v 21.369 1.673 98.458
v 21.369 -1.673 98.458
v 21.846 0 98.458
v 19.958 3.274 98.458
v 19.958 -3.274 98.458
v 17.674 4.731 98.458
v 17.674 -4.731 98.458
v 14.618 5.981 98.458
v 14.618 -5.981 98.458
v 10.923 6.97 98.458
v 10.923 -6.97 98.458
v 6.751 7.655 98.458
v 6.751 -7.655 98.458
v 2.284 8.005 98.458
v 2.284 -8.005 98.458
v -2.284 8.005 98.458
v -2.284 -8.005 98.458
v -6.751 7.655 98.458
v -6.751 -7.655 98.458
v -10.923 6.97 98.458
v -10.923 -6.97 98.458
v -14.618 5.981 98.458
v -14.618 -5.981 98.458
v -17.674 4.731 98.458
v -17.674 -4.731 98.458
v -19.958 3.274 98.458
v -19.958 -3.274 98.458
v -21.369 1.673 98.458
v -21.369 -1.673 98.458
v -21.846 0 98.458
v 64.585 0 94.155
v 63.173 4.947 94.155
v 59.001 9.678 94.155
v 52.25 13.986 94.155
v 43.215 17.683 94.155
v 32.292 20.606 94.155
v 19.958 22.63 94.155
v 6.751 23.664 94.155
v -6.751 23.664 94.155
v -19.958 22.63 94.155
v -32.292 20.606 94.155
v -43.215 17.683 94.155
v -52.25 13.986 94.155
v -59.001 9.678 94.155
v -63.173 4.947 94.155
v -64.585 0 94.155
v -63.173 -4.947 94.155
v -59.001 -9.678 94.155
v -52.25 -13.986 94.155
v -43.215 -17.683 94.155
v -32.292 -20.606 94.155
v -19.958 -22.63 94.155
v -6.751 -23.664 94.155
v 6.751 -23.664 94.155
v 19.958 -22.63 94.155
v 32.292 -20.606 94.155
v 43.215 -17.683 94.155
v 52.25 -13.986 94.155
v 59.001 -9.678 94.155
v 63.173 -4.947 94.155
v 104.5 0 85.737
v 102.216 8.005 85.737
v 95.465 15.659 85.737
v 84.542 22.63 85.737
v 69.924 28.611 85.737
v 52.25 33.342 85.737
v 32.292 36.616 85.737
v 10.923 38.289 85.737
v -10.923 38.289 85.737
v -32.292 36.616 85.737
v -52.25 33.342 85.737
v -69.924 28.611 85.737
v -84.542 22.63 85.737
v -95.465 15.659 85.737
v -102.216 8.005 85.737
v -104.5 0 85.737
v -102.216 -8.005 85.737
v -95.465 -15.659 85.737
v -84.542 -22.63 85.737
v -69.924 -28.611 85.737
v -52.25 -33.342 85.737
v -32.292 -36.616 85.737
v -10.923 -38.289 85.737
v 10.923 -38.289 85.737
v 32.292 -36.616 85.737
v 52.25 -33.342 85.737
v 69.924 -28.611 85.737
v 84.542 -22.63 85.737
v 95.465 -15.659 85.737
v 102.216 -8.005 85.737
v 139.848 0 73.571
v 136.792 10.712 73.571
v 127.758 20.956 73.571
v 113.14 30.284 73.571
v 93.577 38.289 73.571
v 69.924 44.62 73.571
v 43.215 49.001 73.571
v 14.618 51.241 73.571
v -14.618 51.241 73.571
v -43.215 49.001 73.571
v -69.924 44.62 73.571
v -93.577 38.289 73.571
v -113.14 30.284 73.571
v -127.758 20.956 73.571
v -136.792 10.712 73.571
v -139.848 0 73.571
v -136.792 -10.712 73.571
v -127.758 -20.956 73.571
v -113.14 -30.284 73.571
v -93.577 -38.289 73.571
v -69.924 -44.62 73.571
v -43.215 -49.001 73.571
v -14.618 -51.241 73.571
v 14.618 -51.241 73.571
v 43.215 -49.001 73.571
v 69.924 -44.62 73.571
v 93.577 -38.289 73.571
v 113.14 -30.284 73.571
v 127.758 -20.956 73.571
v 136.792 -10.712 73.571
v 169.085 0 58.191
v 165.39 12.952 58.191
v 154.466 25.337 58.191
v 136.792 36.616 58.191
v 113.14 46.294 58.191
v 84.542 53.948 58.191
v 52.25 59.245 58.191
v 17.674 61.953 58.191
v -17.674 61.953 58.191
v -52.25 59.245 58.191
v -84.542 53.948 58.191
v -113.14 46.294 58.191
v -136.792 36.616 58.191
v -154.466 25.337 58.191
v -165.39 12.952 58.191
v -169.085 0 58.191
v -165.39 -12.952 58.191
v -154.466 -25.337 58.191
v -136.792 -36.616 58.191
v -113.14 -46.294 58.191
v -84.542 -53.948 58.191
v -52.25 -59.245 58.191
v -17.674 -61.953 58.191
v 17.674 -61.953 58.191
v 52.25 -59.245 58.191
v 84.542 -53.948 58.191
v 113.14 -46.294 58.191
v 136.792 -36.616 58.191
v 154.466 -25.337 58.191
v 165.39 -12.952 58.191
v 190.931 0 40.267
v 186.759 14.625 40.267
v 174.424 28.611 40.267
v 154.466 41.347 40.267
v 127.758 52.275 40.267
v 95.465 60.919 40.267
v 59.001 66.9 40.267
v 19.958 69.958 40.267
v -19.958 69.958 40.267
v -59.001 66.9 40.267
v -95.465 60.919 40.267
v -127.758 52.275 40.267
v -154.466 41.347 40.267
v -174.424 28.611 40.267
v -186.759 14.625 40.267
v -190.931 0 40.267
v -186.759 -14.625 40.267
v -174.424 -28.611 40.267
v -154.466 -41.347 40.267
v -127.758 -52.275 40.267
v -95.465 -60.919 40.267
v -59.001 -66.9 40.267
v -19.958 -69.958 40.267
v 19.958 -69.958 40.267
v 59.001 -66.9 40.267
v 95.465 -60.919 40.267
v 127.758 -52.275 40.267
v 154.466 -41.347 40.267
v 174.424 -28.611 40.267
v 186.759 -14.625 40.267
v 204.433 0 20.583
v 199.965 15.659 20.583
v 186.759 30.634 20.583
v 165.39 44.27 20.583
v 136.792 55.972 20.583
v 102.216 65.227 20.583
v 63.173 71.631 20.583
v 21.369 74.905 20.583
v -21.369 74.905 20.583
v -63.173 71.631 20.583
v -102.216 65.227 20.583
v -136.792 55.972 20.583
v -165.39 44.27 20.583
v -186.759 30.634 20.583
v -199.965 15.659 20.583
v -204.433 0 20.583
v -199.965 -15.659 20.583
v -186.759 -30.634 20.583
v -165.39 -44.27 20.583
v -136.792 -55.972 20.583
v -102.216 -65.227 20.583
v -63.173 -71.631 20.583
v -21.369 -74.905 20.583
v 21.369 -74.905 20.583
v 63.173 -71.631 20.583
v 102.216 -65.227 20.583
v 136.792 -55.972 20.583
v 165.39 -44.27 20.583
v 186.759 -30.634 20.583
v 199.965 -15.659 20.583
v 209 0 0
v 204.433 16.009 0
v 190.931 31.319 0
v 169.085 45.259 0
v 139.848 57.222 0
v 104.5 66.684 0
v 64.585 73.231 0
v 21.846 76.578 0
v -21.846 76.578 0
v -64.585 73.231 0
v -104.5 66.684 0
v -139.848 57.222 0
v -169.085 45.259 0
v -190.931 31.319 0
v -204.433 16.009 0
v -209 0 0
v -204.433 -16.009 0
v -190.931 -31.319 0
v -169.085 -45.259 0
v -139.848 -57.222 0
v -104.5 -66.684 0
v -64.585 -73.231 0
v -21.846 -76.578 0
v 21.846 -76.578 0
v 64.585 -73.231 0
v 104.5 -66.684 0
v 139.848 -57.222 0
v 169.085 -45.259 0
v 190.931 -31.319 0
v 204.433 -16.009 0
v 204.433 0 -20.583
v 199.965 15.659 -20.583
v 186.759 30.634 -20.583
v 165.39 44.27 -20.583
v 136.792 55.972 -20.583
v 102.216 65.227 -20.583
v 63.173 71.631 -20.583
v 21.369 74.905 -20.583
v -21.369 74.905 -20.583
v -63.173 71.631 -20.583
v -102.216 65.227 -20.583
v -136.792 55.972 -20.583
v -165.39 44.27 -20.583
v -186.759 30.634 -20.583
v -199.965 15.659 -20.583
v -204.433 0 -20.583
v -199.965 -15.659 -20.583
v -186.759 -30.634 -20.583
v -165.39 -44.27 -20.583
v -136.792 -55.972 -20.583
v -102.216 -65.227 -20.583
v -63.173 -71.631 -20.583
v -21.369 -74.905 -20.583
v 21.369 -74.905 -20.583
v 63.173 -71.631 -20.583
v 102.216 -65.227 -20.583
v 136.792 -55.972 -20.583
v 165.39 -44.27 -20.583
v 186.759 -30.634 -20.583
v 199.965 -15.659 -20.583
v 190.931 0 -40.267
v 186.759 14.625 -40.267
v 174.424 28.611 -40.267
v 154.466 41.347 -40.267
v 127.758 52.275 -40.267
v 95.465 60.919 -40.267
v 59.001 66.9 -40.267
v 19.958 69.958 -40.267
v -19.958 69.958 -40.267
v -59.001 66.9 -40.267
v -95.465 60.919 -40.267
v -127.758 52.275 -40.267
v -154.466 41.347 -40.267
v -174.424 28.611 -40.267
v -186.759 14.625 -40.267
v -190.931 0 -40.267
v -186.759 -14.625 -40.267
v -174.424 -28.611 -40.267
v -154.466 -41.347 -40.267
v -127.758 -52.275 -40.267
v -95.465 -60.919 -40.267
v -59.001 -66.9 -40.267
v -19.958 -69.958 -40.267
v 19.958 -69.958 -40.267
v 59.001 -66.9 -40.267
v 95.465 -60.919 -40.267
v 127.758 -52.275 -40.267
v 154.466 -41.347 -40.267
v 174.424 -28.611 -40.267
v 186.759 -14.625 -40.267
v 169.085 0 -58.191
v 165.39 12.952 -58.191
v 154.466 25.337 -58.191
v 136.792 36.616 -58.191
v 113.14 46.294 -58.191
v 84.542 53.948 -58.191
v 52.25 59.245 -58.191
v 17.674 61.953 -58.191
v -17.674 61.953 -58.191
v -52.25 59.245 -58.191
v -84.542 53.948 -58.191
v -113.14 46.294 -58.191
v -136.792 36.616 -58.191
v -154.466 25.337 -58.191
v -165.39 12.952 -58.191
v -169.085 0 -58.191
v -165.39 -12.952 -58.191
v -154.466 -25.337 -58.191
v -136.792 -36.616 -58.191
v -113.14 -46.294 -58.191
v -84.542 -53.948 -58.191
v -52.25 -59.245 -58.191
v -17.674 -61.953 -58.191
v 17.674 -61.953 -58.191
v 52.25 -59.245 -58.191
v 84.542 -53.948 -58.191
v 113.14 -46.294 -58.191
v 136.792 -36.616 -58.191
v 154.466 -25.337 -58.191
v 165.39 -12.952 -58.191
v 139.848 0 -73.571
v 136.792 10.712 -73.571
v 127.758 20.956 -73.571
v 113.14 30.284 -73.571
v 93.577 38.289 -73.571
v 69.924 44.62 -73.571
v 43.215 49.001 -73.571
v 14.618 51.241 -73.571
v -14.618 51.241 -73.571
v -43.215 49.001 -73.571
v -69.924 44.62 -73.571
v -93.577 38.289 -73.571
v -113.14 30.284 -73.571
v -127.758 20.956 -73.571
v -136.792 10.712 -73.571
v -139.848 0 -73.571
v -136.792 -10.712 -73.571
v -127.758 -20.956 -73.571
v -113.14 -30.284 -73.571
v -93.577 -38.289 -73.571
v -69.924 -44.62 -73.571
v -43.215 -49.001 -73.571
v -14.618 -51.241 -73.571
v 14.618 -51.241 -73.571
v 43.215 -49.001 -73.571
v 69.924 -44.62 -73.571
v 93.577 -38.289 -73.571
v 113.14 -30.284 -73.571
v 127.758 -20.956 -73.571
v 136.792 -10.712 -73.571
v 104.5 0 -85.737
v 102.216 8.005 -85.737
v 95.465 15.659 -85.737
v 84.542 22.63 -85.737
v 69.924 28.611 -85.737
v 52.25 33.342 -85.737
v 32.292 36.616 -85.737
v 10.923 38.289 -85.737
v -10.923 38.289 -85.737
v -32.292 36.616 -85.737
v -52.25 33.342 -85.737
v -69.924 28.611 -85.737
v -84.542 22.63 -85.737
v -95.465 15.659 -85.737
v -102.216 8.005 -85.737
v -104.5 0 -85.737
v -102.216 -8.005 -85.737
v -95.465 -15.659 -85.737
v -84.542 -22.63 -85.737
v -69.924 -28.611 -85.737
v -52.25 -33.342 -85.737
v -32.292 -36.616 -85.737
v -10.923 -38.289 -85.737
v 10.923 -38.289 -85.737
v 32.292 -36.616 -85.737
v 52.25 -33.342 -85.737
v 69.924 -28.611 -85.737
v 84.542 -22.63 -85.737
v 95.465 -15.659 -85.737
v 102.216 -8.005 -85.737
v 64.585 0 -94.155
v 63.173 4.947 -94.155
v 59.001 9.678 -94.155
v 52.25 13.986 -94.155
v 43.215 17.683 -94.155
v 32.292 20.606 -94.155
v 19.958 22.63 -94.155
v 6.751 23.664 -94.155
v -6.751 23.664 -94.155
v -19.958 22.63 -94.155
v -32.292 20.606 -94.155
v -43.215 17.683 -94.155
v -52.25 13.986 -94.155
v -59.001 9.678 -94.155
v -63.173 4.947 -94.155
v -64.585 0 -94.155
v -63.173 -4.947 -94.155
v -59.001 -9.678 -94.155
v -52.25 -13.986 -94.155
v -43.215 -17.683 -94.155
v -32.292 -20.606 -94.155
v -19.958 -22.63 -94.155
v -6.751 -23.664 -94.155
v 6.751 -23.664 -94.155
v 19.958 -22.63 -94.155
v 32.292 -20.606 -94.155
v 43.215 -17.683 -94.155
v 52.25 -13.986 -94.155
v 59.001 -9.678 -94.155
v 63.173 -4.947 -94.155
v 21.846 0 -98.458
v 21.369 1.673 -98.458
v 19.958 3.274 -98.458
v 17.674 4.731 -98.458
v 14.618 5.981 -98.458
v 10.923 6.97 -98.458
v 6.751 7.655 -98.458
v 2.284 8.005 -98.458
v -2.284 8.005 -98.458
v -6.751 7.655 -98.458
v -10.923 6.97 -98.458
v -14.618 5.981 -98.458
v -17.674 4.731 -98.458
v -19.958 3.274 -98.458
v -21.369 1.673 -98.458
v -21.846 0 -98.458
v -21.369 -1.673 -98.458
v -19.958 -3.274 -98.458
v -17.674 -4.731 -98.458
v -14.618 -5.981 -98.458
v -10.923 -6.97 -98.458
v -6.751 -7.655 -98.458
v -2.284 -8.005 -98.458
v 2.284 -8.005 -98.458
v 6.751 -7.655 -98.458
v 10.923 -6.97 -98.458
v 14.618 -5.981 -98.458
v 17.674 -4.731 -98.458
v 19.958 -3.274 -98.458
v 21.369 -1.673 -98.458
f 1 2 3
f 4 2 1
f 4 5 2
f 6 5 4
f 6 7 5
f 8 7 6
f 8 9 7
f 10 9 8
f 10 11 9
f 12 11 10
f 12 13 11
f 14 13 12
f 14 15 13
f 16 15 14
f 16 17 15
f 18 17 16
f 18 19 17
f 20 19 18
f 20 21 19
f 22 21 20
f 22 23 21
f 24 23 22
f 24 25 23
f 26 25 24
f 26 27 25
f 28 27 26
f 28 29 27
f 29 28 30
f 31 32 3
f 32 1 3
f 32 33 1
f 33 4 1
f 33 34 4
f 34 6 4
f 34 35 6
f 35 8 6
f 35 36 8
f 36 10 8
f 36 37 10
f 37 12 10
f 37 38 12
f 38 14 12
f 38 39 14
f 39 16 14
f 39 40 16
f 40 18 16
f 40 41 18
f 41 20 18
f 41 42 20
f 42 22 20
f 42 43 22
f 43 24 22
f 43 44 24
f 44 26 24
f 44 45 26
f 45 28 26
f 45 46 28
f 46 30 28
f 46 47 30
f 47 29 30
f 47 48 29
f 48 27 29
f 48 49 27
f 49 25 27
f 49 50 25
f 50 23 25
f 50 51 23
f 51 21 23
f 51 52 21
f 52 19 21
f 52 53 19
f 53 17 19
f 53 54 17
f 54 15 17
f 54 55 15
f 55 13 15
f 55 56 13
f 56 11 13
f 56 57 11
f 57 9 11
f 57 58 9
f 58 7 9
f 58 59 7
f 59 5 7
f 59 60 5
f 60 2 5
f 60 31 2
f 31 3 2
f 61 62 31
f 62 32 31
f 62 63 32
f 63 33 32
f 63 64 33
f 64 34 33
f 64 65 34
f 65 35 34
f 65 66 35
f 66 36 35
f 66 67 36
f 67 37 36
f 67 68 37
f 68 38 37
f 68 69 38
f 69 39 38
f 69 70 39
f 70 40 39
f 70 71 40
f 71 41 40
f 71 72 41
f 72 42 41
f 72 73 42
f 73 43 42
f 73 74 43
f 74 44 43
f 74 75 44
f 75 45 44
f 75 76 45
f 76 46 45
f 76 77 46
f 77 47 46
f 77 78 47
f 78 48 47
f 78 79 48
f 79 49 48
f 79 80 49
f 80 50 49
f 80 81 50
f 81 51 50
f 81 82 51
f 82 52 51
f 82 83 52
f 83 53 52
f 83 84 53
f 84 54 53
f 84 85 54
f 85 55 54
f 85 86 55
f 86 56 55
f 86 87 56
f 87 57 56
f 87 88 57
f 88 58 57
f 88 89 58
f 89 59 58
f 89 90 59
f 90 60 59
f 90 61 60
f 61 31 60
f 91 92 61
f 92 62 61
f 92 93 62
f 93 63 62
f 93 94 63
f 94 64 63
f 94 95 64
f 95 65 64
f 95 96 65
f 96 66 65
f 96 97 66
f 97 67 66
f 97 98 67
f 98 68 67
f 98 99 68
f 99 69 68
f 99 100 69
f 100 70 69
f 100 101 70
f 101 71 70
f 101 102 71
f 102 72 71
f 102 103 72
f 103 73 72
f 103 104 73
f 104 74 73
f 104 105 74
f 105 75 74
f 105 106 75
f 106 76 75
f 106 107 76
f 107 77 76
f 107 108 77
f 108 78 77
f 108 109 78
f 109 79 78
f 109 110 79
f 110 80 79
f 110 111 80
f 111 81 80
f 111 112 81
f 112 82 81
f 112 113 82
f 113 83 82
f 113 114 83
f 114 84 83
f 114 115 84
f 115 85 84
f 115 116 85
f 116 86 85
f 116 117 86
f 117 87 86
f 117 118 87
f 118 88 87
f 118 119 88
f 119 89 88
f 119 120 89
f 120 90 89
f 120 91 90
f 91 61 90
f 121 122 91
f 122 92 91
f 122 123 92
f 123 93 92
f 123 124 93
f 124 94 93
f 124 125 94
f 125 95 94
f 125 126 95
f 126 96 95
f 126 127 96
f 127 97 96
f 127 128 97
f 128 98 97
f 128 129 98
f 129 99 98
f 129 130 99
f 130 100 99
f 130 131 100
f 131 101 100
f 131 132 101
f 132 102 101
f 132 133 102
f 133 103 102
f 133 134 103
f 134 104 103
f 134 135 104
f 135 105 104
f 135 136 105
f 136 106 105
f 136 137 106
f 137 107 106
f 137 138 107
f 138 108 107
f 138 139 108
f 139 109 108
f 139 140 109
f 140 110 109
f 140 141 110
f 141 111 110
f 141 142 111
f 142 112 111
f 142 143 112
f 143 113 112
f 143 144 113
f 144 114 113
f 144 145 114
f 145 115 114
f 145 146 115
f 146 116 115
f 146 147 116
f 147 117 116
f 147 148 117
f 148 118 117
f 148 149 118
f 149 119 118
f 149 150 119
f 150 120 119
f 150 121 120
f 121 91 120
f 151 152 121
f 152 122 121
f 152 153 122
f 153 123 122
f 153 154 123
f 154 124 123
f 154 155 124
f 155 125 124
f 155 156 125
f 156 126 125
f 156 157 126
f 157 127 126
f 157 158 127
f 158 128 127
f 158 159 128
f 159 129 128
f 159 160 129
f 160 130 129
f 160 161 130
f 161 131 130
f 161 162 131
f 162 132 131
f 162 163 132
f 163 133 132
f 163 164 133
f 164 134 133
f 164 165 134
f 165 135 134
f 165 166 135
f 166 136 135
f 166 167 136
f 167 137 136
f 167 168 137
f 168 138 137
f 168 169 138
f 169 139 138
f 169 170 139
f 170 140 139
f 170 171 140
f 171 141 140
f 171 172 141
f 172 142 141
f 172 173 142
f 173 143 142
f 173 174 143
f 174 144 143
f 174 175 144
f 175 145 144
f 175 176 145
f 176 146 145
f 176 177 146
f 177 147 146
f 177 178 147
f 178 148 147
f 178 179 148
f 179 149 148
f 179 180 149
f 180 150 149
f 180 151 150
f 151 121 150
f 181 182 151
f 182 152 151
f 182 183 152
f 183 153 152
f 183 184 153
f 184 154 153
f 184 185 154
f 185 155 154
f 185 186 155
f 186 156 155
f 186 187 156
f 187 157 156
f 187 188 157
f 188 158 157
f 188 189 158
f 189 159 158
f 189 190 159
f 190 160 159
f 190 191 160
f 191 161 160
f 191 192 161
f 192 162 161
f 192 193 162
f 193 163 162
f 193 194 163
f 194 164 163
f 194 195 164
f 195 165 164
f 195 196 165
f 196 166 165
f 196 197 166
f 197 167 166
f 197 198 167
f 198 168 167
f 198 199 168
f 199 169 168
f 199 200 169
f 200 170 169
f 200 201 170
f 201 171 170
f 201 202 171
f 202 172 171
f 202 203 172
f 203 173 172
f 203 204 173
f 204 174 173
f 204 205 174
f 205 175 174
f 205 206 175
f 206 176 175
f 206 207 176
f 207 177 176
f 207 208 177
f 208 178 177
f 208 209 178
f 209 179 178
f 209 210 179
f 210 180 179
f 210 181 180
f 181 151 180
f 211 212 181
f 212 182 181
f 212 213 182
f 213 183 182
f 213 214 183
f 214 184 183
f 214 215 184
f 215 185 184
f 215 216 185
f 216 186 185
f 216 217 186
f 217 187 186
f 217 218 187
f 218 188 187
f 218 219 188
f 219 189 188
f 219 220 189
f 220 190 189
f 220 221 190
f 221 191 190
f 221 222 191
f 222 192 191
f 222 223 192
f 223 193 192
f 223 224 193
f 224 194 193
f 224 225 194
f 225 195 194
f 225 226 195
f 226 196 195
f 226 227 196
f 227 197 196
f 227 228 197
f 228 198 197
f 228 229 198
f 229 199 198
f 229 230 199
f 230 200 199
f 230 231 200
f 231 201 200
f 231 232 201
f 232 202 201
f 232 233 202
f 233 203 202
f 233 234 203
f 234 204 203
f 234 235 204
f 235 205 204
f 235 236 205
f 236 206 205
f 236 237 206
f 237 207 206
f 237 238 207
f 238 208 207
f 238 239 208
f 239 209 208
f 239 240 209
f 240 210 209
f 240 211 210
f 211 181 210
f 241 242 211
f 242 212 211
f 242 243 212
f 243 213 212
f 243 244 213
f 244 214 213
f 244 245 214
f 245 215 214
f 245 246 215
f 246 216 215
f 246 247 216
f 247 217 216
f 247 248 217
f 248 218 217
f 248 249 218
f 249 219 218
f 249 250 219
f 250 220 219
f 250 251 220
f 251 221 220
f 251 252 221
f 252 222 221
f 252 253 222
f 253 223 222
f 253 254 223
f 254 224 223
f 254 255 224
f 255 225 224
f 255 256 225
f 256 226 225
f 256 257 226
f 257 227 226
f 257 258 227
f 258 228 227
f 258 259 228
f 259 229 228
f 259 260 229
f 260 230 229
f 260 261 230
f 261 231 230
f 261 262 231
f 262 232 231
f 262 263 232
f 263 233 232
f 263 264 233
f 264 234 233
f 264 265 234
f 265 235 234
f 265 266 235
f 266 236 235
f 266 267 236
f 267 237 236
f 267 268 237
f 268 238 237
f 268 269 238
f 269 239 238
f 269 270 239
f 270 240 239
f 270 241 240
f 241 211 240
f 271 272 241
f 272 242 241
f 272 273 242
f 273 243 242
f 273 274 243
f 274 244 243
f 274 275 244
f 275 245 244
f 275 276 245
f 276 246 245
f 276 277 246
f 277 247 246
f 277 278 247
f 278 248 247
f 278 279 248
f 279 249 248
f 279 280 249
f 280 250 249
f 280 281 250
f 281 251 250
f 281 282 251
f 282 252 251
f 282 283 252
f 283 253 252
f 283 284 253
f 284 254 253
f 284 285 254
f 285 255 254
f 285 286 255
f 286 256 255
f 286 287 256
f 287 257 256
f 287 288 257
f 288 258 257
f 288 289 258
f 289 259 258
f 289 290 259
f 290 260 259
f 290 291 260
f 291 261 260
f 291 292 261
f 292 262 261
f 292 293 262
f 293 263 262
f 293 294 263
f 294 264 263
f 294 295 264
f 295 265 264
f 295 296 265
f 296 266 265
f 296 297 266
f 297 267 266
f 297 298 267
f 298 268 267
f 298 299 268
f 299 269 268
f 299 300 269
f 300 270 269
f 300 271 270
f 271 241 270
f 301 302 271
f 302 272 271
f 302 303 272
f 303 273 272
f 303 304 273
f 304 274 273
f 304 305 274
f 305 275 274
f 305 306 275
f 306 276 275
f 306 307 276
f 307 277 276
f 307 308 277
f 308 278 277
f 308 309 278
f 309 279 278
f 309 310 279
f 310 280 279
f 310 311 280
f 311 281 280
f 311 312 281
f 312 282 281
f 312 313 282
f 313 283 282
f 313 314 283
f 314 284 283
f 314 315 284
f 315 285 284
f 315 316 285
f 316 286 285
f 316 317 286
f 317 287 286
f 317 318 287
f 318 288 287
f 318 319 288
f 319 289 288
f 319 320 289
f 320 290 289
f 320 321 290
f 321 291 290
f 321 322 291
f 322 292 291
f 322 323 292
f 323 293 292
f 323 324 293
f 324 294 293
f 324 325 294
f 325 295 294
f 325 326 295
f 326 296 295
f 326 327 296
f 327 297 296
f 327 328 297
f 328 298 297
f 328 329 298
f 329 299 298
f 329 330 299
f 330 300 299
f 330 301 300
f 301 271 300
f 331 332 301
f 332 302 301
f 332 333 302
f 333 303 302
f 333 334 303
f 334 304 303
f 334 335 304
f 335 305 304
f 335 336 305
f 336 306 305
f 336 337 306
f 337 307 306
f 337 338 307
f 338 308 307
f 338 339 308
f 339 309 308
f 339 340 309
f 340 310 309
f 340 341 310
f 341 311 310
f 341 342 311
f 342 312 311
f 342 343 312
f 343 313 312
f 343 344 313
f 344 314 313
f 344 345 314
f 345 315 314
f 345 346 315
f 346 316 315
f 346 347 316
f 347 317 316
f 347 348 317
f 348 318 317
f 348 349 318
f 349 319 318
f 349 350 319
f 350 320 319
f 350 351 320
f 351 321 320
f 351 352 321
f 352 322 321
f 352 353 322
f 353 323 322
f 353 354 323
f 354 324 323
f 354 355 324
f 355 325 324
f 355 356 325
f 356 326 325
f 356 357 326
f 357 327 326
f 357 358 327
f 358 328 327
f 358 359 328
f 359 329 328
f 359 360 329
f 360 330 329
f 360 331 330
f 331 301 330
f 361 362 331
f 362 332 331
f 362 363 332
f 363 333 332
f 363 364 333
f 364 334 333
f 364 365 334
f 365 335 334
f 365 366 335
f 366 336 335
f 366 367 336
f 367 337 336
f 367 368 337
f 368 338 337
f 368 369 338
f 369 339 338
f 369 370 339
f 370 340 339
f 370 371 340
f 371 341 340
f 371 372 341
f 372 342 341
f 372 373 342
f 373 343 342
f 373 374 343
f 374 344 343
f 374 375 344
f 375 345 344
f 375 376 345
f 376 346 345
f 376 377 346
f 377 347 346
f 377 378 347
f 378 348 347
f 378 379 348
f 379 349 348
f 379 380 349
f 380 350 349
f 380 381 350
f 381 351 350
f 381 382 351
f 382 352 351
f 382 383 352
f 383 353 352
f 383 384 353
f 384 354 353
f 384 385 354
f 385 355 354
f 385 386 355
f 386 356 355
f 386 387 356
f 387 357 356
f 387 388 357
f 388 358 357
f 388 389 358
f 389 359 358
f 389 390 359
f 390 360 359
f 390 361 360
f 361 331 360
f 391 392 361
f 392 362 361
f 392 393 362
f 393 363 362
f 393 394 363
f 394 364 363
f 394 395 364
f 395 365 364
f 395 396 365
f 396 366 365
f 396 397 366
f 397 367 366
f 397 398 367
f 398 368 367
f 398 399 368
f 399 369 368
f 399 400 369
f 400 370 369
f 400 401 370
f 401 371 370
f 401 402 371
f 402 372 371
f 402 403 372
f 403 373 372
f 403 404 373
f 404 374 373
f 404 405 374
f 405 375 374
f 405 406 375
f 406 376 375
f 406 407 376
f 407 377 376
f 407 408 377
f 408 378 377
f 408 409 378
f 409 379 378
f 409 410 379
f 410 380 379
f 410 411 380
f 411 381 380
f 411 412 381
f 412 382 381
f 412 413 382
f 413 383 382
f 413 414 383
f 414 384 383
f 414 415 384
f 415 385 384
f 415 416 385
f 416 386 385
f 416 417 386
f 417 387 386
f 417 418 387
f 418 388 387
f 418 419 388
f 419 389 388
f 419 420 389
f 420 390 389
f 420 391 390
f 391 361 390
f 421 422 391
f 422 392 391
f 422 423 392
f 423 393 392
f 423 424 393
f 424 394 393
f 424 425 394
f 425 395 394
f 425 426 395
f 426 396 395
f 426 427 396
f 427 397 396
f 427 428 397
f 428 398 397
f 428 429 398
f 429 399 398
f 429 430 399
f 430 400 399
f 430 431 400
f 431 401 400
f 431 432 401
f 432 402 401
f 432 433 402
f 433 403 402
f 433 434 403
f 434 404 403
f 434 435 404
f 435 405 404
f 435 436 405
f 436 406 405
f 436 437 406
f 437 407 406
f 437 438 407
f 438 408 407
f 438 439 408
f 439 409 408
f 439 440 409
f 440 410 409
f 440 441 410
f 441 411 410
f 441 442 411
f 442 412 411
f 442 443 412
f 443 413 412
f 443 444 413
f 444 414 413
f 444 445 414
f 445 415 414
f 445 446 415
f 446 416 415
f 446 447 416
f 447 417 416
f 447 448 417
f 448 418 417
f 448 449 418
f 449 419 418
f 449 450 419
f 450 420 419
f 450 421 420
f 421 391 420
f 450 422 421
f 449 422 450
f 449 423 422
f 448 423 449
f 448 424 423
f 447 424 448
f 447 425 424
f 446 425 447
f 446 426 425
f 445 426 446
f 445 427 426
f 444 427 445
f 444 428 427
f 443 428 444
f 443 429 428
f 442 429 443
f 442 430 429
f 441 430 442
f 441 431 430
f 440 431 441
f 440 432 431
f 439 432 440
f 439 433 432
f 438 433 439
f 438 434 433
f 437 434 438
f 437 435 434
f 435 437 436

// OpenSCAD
// Generated by SolidPython 1.0.1 on 2020-07-29 00:46:53


scale(v = [19, 7, 9]) {
	sphere(r = 11);
}
/***********************************************
*********      SolidPython code:      **********
************************************************
 
# import packages: SolidPython
from solid import *
from solid.utils import *
from itertools import chain, combinations, permutations


class Resize:

    def __init__(self, scad_file):
        self.scad_file = scad_file
        #self.scad_file = import_scad(scad_file)
        # cone/cylinder param:
        self.r1 = 0
        self.r2 = 0
        self.h = 0
        # rectangular prism param:
        self.w = 0
        self.l = 0
        # ellipse param:
        self.r = 0

    # import OpenScad code (file name corresponds to shape)


    # classify shape + parameters
    def assign(self, param1, param2, param3):
        if self.scad_file == 'cone.scad':
            self.r1 = param1
            self.r2 = param2
            self.h = param3
        elif self.scad_file == 'cylinder.scad':
            self.r1 = param1
            self.r2 = param2
            self.h = param3
        elif self.scad_file == 'rectangularPrism.scad':
            self.h = param1
            self.l = param2
            self.w = param3
        else:
            self.r = param1
            self.h = param2

    # resize parameters
    def iterate(self):
        x = range(3, 20, 2)
        i = 1
        if self.scad_file == 'cone.scad':
            tempList = list(permutations(x, 2))
            for temp in tempList:
                param1 = temp[0]
                param2 = temp[1]
                filepath = 'produced_scad_files/' + 'cone' + str(param1) + '_' + str(param2) + '_' + '.scad'
                scad_render_to_file(cylinder(h=param1, r1=param2, r2=0), filepath)

        elif self.scad_file == 'cylinder.scad':
            tempList = list(permutations(x, 3))
            for temp in tempList:
                param1 = temp[0]
                param2 = temp[1]
                filepath = 'produced_scad_files/' + 'cylinder' + str(param1) + '_' + str(param2) + '_' + '.scad'
                scad_render_to_file(cylinder(h=param1, r1=param2, r2=param2), filepath)

        elif self.scad_file == 'rectangularPrism.scad':
            tempList = list(permutations(x, 3))
            for temp in tempList:
                param1 = temp[0]
                param2 = temp[1]
                param3 = temp[2]
                filepath = 'produced_scad_files/' + 'rectangularPrism' + str(param1) + '_' + str(param2) + '_' + str(
                    param3) + '.scad'
                scad_render_to_file(cube(size=(param1, param2, param3)), filepath)

        elif self.scad_file == 'ellipse.scad':
            tempList = list(permutations(x, 4))
            for temp in tempList:
                param1 = temp[0]
                param2 = temp[1]
                param3 = temp[2]
                param4 = temp[3]
                filepath = 'produced_scad_files/' + 'ellipse' + str(param1) + '_' + str(param2) + '_' + str(param3) + '_' + str(param4) + '.scad'
                scad_render_to_file(scale([param1, param2, param3])(sphere(r=param4)), filepath)

    def render_to_scadfile(self):
        scad_render_to_file(scad, 'example.scad') 
 
************************************************/
